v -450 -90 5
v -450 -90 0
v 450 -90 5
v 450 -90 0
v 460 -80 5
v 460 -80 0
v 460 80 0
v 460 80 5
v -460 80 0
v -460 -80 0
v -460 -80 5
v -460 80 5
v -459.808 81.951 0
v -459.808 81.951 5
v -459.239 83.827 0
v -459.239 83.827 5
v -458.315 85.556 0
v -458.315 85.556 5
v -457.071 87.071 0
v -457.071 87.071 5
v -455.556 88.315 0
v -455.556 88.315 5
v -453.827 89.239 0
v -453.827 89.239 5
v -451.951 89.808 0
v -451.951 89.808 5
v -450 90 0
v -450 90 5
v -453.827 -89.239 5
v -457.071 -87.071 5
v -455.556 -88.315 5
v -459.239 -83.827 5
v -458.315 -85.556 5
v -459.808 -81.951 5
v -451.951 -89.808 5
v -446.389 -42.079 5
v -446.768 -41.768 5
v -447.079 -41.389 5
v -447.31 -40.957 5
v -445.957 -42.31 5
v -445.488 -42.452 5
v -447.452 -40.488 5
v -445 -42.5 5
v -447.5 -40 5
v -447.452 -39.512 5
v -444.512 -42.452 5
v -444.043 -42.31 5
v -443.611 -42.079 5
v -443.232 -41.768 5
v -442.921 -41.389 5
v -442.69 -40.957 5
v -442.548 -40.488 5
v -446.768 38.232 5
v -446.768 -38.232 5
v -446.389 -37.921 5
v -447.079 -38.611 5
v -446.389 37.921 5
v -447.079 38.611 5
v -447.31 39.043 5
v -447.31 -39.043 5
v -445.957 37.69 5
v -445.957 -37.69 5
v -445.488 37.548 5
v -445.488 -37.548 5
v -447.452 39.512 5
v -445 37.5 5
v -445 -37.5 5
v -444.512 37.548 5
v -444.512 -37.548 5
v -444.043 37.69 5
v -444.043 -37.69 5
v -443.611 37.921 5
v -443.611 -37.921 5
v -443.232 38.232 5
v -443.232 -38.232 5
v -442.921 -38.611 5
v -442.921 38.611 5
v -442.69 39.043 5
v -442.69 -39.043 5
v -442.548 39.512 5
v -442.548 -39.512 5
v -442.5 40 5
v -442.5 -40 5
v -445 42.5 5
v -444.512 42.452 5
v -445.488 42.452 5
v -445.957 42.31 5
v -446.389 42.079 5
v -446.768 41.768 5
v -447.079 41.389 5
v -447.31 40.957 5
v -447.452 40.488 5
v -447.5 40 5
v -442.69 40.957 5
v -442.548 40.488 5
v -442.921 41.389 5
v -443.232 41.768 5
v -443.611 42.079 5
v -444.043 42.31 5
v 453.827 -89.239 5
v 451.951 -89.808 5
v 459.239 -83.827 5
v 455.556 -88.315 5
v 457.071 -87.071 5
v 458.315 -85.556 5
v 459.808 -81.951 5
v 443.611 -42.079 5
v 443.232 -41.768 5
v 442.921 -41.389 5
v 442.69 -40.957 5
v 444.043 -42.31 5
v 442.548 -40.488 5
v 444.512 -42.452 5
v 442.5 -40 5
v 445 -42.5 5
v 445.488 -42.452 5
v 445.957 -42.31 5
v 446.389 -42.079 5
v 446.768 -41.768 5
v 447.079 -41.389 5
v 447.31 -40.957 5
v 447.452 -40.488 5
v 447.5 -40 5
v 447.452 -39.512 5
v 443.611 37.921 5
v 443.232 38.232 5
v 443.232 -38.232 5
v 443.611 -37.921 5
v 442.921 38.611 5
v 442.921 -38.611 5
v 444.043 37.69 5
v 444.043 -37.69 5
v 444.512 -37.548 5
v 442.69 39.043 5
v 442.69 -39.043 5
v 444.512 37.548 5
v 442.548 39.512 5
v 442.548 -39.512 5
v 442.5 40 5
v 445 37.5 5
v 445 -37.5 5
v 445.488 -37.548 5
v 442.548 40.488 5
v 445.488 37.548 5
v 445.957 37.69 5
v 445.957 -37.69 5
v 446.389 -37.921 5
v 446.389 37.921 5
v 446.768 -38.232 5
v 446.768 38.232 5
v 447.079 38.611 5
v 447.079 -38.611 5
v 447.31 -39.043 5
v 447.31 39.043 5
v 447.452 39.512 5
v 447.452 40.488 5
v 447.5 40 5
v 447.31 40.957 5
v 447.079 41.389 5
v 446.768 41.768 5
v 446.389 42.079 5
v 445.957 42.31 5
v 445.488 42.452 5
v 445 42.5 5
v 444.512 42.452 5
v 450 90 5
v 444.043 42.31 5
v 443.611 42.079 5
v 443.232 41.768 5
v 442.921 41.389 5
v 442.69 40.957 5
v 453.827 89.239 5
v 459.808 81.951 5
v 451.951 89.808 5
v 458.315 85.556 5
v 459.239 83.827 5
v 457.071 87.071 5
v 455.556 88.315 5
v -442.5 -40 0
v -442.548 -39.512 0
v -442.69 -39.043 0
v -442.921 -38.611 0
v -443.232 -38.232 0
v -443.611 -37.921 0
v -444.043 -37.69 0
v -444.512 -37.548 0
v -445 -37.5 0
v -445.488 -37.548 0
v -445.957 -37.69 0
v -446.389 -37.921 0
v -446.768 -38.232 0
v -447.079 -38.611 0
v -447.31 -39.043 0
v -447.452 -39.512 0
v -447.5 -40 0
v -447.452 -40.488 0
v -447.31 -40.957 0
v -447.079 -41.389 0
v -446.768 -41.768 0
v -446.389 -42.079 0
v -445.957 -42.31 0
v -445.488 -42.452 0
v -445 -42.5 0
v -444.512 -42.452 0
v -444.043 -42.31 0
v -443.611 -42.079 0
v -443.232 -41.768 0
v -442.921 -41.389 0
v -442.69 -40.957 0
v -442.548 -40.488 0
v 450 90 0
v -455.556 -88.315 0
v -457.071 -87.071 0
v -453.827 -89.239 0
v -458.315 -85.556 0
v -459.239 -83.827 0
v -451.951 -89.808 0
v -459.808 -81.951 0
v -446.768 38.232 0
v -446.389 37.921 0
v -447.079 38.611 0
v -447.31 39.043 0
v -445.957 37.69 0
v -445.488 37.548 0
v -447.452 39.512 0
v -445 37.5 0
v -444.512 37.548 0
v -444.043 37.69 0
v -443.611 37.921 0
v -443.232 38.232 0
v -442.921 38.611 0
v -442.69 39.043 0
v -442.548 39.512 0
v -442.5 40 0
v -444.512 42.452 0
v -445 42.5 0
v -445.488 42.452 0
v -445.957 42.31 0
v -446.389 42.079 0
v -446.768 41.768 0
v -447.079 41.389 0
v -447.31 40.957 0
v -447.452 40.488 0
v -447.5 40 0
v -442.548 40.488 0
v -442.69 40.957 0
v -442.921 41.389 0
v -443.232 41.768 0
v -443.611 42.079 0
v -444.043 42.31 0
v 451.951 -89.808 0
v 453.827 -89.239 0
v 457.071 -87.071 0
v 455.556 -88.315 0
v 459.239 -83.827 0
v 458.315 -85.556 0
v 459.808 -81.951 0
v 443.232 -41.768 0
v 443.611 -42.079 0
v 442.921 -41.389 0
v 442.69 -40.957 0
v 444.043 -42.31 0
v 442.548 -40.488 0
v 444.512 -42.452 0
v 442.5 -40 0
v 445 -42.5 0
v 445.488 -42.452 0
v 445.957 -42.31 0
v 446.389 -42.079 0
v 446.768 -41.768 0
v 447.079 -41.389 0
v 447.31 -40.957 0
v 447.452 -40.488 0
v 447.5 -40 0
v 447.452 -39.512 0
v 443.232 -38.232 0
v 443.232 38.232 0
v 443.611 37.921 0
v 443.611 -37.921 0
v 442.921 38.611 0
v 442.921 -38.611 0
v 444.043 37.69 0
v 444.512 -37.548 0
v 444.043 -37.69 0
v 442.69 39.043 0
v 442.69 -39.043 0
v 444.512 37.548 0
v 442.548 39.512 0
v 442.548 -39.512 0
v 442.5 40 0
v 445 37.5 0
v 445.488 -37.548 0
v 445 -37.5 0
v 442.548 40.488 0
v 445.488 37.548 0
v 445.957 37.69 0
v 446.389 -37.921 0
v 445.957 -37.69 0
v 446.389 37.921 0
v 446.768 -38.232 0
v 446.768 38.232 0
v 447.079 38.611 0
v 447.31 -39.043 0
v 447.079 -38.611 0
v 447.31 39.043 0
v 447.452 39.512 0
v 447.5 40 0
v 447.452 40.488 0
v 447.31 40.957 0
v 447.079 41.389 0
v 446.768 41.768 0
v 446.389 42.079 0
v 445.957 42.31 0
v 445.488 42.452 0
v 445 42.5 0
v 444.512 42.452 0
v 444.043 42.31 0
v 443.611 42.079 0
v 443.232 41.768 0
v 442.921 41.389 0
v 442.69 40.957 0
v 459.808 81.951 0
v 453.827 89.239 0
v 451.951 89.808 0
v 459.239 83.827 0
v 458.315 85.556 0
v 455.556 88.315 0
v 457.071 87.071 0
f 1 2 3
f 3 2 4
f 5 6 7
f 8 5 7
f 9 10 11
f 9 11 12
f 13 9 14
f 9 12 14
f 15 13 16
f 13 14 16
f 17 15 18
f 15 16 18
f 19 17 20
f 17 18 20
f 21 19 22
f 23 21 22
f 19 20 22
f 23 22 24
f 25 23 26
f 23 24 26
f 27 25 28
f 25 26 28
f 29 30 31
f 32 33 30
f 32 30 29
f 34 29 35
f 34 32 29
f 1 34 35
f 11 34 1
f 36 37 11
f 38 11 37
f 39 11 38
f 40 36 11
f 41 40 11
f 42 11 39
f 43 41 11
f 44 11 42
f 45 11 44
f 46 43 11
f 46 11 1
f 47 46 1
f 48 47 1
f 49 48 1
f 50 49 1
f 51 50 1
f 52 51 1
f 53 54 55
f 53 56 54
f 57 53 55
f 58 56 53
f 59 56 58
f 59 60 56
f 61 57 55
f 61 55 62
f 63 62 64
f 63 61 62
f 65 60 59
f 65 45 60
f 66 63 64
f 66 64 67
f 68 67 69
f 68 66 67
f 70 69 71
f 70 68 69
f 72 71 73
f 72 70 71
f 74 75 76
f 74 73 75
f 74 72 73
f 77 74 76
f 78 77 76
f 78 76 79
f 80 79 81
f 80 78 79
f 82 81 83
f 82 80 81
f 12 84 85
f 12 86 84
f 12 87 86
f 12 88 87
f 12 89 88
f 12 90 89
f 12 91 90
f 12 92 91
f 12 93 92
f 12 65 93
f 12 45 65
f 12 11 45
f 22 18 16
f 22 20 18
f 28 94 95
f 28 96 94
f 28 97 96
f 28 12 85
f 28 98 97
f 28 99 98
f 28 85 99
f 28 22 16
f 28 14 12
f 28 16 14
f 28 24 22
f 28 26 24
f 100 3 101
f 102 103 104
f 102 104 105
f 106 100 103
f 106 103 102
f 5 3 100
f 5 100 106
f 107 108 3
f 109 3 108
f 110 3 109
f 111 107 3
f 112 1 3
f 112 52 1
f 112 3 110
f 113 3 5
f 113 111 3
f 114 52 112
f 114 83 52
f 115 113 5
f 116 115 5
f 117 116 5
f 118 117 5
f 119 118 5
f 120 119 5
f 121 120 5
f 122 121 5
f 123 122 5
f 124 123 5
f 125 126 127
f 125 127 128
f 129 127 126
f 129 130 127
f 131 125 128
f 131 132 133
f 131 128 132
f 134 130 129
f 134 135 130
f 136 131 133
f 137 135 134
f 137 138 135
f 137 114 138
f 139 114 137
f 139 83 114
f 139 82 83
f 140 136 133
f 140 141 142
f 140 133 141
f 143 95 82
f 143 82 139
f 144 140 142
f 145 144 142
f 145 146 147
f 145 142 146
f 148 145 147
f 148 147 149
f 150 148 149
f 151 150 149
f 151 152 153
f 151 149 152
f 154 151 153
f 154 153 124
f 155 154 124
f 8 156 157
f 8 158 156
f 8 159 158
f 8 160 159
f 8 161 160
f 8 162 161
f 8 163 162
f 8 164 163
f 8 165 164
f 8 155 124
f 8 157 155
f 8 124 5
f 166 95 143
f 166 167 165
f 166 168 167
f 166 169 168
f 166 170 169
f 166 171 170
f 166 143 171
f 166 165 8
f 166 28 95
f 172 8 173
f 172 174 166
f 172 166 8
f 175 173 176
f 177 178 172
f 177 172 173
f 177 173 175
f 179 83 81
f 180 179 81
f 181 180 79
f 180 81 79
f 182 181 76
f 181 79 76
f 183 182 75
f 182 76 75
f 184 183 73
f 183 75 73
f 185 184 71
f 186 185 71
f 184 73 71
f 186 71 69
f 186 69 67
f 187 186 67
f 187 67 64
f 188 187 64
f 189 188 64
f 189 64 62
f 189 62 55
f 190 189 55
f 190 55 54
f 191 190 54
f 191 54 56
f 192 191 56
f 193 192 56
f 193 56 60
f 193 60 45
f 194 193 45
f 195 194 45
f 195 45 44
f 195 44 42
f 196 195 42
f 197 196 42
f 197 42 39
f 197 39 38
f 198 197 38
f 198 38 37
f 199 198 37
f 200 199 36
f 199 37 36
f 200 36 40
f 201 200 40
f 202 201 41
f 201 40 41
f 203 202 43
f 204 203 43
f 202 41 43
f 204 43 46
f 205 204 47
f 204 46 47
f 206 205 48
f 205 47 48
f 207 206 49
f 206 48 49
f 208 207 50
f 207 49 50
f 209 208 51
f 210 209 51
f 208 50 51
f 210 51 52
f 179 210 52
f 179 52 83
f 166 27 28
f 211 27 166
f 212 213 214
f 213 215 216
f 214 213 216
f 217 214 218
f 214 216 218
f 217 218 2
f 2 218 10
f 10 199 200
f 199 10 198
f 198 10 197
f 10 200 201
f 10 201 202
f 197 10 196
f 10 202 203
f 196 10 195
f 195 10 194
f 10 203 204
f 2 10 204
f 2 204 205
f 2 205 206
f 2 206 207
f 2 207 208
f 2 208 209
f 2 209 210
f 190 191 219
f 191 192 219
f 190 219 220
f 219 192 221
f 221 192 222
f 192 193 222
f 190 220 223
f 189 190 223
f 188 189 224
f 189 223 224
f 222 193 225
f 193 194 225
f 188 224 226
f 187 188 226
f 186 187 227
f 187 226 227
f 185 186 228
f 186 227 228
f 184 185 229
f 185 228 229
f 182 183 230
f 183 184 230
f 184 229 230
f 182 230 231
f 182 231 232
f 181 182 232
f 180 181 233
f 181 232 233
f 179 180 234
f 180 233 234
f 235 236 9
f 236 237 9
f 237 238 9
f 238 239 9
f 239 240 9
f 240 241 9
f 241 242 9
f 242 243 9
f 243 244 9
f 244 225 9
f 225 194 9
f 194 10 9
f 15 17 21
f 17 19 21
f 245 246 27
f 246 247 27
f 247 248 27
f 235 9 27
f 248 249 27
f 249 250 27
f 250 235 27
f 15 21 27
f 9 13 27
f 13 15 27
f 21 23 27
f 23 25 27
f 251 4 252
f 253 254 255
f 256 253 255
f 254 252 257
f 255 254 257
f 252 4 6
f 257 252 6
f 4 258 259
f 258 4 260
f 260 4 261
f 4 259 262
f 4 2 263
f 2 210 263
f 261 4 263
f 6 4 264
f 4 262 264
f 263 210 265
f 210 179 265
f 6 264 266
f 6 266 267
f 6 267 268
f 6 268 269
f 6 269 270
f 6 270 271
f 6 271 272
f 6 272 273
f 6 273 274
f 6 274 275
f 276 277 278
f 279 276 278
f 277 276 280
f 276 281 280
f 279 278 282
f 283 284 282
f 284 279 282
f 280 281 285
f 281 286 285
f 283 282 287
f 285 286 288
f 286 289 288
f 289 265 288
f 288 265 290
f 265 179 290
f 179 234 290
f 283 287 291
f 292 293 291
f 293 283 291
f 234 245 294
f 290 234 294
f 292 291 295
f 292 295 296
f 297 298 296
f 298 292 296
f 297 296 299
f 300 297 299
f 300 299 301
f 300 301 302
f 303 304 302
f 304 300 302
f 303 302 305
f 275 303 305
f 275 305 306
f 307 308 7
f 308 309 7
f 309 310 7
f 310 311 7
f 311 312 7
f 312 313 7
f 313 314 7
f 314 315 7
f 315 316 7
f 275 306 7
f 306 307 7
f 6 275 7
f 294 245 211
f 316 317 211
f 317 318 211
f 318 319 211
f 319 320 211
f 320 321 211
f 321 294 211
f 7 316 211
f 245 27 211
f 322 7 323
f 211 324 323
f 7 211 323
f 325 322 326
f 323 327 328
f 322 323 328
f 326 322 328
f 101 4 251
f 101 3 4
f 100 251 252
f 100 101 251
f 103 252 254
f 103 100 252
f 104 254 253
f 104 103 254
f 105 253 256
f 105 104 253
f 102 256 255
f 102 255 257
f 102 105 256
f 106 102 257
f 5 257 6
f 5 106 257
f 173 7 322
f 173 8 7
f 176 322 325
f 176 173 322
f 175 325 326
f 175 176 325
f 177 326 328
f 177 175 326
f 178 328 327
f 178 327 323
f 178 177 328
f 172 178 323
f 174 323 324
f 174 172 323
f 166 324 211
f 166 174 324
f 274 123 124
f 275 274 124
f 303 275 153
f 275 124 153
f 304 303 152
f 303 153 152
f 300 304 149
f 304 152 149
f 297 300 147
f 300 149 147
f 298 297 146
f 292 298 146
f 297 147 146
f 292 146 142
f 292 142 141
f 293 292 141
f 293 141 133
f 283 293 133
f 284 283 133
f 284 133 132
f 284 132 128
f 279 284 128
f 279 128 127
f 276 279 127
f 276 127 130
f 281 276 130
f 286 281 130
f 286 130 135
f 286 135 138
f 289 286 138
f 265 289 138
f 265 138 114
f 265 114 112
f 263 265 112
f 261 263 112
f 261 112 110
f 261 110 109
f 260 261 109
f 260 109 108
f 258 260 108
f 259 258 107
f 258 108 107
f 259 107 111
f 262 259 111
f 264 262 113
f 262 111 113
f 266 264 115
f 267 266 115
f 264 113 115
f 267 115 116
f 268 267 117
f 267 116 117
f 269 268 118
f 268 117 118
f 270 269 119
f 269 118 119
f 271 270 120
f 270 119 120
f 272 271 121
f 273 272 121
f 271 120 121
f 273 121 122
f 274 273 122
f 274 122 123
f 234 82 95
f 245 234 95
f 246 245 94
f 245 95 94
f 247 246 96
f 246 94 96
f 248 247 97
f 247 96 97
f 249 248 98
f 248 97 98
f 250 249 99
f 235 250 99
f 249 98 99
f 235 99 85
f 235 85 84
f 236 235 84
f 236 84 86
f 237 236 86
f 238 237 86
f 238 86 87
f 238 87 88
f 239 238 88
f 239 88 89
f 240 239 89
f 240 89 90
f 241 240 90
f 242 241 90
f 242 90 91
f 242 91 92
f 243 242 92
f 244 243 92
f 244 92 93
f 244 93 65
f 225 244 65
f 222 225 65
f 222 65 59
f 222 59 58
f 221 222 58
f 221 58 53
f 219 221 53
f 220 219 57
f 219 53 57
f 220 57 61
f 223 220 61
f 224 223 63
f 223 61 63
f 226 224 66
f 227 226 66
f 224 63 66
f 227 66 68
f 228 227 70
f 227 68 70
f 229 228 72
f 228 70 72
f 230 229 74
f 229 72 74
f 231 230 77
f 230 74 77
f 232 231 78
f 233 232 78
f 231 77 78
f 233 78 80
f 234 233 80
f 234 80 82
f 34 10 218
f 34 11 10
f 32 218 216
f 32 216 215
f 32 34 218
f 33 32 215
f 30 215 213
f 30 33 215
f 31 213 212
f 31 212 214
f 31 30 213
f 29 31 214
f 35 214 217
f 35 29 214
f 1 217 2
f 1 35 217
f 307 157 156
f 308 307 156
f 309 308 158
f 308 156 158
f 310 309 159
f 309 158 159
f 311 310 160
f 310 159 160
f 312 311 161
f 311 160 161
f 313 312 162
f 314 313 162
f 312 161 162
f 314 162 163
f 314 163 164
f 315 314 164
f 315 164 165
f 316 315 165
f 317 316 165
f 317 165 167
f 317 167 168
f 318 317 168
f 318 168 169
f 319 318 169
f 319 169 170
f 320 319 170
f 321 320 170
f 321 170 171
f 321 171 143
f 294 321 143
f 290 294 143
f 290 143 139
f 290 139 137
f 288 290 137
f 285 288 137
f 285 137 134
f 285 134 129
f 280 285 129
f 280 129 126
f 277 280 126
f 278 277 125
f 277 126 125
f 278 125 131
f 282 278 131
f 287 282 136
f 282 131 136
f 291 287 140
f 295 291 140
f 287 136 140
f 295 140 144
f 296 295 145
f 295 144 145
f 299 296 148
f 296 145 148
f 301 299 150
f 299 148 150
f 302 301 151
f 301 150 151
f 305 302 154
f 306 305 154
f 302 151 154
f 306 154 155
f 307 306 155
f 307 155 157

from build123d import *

# Parameters (mm, degrees)
CROQUIS1_W     = 920
CROQUIS1_H     = 180
EXTRUIR1_DEPTH = 5
REDONDEO1_R    = 10
CROQUIS2_R     = 2.5
EXTRUIR2_DEPTH = 10


with BuildPart() as part:
    # Croquis1 → Extruir1 (new body)
    with BuildSketch(Plane.XY):
        Rectangle(CROQUIS1_W, CROQUIS1_H)
    extrude(amount=EXTRUIR1_DEPTH)

    # Redondeo1
    redondeo1_edges = [part.edges().sort_by_distance(p)[0] for p in [
        (-460, 90, 2.5),
        (460, 90, 2.5),
        (460, -90, 2.5),
        (-460, -90, 2.5),
    ]]
    fillet(redondeo1_edges, radius=REDONDEO1_R)

    # Croquis2 → Extruir2 (cut)
    with BuildSketch(Plane.XY.offset(5)):
        with Locations((445, 40)):
            Circle(CROQUIS2_R)
        with Locations((445, -40)):
            Circle(CROQUIS2_R)
        with Locations((-445, 40)):
            Circle(CROQUIS2_R)
        with Locations((-445, -40)):
            Circle(CROQUIS2_R)
    extrude(amount=-EXTRUIR2_DEPTH, mode=Mode.SUBTRACT)


solid = part.part
